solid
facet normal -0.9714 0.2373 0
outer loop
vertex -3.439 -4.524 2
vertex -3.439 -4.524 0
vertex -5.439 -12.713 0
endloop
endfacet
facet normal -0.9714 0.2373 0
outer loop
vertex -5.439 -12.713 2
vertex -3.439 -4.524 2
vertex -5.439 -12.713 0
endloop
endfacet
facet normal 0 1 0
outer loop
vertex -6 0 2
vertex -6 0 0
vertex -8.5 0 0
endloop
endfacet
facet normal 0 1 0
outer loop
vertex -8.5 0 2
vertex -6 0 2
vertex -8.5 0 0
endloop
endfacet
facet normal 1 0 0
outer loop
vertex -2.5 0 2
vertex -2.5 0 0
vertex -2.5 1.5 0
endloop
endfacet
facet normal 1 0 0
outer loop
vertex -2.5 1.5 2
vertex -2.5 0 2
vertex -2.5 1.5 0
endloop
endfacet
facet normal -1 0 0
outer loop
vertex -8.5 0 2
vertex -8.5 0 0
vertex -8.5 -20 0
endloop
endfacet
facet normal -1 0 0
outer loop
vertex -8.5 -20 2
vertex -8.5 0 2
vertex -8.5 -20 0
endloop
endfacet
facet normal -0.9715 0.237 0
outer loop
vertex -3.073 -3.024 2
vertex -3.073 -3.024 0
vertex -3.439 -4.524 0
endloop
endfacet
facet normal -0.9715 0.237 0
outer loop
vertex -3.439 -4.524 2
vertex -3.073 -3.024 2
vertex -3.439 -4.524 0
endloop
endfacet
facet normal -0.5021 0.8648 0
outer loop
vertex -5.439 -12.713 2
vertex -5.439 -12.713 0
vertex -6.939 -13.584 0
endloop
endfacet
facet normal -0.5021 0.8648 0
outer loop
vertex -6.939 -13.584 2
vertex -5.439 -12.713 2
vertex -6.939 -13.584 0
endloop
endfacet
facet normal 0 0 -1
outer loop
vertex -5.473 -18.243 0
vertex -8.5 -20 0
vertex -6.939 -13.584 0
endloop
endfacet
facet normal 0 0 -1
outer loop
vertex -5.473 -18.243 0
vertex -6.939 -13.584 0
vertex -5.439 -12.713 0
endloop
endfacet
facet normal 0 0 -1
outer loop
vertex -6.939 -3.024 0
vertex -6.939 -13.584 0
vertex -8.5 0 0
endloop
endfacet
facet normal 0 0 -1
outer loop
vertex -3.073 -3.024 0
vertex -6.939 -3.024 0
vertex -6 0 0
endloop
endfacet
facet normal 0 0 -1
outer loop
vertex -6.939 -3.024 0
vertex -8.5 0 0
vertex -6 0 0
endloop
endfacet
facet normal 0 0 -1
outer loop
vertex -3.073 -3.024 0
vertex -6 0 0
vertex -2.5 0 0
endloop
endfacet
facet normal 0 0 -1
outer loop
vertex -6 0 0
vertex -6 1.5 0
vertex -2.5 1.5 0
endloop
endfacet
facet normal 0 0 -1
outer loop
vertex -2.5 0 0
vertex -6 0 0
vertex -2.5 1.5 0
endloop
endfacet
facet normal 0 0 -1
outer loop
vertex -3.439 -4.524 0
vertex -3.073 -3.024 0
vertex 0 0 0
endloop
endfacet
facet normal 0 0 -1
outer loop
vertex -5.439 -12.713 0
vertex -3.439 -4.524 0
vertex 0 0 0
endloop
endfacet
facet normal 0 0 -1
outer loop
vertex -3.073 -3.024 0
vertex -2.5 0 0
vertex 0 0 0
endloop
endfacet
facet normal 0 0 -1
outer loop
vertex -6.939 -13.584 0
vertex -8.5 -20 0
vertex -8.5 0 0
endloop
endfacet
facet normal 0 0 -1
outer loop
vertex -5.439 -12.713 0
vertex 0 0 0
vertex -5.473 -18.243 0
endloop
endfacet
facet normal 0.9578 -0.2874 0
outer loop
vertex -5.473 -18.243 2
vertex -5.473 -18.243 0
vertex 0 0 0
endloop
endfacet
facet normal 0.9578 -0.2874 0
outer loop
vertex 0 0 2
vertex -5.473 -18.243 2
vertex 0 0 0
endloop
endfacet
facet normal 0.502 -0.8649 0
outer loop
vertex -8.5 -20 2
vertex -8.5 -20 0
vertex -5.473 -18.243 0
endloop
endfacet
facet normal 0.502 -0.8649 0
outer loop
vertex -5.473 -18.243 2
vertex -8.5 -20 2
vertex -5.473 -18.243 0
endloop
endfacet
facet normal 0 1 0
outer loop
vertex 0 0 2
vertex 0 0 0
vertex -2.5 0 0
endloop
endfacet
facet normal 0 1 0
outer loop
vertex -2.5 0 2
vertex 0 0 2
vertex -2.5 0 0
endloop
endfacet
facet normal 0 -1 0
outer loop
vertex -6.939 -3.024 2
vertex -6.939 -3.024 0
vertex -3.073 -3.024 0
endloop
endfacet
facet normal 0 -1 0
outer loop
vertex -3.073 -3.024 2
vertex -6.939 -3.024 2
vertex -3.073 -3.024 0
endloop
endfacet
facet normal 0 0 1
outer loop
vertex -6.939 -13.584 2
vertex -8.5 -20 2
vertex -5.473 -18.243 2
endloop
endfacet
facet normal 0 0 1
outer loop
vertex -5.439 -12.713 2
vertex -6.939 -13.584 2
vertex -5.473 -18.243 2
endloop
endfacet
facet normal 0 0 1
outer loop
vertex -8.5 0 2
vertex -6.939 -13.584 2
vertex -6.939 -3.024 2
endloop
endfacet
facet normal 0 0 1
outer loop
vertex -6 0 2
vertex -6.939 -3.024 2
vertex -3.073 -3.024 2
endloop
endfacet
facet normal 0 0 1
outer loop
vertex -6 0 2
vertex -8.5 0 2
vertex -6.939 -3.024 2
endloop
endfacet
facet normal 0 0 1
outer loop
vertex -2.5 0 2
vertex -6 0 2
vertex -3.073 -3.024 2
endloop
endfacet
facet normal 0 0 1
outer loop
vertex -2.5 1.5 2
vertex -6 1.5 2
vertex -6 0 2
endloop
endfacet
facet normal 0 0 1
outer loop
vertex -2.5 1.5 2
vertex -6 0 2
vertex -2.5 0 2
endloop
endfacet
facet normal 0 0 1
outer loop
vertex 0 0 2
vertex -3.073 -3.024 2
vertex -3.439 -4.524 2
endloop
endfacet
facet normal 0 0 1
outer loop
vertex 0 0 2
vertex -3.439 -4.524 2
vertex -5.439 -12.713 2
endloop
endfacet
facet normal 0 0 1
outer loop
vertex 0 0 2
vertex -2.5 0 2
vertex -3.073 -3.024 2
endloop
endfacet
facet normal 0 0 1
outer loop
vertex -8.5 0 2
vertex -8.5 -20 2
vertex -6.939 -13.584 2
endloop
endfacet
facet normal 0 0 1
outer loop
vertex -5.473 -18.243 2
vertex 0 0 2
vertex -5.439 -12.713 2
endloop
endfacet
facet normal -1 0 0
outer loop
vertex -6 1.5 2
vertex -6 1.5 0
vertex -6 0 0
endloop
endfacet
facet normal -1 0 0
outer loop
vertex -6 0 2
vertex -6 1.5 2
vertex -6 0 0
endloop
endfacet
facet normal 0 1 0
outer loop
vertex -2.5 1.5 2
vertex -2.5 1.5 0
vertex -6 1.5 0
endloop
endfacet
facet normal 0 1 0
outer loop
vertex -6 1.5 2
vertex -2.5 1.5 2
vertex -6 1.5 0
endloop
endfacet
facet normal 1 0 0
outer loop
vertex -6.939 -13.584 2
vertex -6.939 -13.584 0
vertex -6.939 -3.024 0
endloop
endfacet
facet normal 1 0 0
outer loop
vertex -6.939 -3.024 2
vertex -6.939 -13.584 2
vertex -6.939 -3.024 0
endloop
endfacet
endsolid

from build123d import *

# Parameters (mm, degrees)
BOSS_EXTRUDE1_DEPTH = 2


with BuildPart() as part:
    # Sketch1 → Boss-Extrude1 (new body)
    with BuildSketch(Plane.XY):
        Polygon((-8.5, 0), (-8.5, -20), (-5.47292158, -18.243071932), (0, 0), (-2.5, 0), (-2.5, 1.5), (-6, 1.5), (-6, 0), align=None)
        Polygon((-3.439362664, -4.523577139), (-5.439362664, -12.713119984), (-6.939362664, -13.583725808), (-6.939362664, -12.713119984), (-6.939362664, -11.713119984), (-6.939362664, -4.523577139), (-6.939362664, -3.023577139), (-3.439362664, -3.023577139), (-3.07304185, -3.023577139), align=None, mode=Mode.SUBTRACT)
    extrude(amount=BOSS_EXTRUDE1_DEPTH)


solid = part.part
